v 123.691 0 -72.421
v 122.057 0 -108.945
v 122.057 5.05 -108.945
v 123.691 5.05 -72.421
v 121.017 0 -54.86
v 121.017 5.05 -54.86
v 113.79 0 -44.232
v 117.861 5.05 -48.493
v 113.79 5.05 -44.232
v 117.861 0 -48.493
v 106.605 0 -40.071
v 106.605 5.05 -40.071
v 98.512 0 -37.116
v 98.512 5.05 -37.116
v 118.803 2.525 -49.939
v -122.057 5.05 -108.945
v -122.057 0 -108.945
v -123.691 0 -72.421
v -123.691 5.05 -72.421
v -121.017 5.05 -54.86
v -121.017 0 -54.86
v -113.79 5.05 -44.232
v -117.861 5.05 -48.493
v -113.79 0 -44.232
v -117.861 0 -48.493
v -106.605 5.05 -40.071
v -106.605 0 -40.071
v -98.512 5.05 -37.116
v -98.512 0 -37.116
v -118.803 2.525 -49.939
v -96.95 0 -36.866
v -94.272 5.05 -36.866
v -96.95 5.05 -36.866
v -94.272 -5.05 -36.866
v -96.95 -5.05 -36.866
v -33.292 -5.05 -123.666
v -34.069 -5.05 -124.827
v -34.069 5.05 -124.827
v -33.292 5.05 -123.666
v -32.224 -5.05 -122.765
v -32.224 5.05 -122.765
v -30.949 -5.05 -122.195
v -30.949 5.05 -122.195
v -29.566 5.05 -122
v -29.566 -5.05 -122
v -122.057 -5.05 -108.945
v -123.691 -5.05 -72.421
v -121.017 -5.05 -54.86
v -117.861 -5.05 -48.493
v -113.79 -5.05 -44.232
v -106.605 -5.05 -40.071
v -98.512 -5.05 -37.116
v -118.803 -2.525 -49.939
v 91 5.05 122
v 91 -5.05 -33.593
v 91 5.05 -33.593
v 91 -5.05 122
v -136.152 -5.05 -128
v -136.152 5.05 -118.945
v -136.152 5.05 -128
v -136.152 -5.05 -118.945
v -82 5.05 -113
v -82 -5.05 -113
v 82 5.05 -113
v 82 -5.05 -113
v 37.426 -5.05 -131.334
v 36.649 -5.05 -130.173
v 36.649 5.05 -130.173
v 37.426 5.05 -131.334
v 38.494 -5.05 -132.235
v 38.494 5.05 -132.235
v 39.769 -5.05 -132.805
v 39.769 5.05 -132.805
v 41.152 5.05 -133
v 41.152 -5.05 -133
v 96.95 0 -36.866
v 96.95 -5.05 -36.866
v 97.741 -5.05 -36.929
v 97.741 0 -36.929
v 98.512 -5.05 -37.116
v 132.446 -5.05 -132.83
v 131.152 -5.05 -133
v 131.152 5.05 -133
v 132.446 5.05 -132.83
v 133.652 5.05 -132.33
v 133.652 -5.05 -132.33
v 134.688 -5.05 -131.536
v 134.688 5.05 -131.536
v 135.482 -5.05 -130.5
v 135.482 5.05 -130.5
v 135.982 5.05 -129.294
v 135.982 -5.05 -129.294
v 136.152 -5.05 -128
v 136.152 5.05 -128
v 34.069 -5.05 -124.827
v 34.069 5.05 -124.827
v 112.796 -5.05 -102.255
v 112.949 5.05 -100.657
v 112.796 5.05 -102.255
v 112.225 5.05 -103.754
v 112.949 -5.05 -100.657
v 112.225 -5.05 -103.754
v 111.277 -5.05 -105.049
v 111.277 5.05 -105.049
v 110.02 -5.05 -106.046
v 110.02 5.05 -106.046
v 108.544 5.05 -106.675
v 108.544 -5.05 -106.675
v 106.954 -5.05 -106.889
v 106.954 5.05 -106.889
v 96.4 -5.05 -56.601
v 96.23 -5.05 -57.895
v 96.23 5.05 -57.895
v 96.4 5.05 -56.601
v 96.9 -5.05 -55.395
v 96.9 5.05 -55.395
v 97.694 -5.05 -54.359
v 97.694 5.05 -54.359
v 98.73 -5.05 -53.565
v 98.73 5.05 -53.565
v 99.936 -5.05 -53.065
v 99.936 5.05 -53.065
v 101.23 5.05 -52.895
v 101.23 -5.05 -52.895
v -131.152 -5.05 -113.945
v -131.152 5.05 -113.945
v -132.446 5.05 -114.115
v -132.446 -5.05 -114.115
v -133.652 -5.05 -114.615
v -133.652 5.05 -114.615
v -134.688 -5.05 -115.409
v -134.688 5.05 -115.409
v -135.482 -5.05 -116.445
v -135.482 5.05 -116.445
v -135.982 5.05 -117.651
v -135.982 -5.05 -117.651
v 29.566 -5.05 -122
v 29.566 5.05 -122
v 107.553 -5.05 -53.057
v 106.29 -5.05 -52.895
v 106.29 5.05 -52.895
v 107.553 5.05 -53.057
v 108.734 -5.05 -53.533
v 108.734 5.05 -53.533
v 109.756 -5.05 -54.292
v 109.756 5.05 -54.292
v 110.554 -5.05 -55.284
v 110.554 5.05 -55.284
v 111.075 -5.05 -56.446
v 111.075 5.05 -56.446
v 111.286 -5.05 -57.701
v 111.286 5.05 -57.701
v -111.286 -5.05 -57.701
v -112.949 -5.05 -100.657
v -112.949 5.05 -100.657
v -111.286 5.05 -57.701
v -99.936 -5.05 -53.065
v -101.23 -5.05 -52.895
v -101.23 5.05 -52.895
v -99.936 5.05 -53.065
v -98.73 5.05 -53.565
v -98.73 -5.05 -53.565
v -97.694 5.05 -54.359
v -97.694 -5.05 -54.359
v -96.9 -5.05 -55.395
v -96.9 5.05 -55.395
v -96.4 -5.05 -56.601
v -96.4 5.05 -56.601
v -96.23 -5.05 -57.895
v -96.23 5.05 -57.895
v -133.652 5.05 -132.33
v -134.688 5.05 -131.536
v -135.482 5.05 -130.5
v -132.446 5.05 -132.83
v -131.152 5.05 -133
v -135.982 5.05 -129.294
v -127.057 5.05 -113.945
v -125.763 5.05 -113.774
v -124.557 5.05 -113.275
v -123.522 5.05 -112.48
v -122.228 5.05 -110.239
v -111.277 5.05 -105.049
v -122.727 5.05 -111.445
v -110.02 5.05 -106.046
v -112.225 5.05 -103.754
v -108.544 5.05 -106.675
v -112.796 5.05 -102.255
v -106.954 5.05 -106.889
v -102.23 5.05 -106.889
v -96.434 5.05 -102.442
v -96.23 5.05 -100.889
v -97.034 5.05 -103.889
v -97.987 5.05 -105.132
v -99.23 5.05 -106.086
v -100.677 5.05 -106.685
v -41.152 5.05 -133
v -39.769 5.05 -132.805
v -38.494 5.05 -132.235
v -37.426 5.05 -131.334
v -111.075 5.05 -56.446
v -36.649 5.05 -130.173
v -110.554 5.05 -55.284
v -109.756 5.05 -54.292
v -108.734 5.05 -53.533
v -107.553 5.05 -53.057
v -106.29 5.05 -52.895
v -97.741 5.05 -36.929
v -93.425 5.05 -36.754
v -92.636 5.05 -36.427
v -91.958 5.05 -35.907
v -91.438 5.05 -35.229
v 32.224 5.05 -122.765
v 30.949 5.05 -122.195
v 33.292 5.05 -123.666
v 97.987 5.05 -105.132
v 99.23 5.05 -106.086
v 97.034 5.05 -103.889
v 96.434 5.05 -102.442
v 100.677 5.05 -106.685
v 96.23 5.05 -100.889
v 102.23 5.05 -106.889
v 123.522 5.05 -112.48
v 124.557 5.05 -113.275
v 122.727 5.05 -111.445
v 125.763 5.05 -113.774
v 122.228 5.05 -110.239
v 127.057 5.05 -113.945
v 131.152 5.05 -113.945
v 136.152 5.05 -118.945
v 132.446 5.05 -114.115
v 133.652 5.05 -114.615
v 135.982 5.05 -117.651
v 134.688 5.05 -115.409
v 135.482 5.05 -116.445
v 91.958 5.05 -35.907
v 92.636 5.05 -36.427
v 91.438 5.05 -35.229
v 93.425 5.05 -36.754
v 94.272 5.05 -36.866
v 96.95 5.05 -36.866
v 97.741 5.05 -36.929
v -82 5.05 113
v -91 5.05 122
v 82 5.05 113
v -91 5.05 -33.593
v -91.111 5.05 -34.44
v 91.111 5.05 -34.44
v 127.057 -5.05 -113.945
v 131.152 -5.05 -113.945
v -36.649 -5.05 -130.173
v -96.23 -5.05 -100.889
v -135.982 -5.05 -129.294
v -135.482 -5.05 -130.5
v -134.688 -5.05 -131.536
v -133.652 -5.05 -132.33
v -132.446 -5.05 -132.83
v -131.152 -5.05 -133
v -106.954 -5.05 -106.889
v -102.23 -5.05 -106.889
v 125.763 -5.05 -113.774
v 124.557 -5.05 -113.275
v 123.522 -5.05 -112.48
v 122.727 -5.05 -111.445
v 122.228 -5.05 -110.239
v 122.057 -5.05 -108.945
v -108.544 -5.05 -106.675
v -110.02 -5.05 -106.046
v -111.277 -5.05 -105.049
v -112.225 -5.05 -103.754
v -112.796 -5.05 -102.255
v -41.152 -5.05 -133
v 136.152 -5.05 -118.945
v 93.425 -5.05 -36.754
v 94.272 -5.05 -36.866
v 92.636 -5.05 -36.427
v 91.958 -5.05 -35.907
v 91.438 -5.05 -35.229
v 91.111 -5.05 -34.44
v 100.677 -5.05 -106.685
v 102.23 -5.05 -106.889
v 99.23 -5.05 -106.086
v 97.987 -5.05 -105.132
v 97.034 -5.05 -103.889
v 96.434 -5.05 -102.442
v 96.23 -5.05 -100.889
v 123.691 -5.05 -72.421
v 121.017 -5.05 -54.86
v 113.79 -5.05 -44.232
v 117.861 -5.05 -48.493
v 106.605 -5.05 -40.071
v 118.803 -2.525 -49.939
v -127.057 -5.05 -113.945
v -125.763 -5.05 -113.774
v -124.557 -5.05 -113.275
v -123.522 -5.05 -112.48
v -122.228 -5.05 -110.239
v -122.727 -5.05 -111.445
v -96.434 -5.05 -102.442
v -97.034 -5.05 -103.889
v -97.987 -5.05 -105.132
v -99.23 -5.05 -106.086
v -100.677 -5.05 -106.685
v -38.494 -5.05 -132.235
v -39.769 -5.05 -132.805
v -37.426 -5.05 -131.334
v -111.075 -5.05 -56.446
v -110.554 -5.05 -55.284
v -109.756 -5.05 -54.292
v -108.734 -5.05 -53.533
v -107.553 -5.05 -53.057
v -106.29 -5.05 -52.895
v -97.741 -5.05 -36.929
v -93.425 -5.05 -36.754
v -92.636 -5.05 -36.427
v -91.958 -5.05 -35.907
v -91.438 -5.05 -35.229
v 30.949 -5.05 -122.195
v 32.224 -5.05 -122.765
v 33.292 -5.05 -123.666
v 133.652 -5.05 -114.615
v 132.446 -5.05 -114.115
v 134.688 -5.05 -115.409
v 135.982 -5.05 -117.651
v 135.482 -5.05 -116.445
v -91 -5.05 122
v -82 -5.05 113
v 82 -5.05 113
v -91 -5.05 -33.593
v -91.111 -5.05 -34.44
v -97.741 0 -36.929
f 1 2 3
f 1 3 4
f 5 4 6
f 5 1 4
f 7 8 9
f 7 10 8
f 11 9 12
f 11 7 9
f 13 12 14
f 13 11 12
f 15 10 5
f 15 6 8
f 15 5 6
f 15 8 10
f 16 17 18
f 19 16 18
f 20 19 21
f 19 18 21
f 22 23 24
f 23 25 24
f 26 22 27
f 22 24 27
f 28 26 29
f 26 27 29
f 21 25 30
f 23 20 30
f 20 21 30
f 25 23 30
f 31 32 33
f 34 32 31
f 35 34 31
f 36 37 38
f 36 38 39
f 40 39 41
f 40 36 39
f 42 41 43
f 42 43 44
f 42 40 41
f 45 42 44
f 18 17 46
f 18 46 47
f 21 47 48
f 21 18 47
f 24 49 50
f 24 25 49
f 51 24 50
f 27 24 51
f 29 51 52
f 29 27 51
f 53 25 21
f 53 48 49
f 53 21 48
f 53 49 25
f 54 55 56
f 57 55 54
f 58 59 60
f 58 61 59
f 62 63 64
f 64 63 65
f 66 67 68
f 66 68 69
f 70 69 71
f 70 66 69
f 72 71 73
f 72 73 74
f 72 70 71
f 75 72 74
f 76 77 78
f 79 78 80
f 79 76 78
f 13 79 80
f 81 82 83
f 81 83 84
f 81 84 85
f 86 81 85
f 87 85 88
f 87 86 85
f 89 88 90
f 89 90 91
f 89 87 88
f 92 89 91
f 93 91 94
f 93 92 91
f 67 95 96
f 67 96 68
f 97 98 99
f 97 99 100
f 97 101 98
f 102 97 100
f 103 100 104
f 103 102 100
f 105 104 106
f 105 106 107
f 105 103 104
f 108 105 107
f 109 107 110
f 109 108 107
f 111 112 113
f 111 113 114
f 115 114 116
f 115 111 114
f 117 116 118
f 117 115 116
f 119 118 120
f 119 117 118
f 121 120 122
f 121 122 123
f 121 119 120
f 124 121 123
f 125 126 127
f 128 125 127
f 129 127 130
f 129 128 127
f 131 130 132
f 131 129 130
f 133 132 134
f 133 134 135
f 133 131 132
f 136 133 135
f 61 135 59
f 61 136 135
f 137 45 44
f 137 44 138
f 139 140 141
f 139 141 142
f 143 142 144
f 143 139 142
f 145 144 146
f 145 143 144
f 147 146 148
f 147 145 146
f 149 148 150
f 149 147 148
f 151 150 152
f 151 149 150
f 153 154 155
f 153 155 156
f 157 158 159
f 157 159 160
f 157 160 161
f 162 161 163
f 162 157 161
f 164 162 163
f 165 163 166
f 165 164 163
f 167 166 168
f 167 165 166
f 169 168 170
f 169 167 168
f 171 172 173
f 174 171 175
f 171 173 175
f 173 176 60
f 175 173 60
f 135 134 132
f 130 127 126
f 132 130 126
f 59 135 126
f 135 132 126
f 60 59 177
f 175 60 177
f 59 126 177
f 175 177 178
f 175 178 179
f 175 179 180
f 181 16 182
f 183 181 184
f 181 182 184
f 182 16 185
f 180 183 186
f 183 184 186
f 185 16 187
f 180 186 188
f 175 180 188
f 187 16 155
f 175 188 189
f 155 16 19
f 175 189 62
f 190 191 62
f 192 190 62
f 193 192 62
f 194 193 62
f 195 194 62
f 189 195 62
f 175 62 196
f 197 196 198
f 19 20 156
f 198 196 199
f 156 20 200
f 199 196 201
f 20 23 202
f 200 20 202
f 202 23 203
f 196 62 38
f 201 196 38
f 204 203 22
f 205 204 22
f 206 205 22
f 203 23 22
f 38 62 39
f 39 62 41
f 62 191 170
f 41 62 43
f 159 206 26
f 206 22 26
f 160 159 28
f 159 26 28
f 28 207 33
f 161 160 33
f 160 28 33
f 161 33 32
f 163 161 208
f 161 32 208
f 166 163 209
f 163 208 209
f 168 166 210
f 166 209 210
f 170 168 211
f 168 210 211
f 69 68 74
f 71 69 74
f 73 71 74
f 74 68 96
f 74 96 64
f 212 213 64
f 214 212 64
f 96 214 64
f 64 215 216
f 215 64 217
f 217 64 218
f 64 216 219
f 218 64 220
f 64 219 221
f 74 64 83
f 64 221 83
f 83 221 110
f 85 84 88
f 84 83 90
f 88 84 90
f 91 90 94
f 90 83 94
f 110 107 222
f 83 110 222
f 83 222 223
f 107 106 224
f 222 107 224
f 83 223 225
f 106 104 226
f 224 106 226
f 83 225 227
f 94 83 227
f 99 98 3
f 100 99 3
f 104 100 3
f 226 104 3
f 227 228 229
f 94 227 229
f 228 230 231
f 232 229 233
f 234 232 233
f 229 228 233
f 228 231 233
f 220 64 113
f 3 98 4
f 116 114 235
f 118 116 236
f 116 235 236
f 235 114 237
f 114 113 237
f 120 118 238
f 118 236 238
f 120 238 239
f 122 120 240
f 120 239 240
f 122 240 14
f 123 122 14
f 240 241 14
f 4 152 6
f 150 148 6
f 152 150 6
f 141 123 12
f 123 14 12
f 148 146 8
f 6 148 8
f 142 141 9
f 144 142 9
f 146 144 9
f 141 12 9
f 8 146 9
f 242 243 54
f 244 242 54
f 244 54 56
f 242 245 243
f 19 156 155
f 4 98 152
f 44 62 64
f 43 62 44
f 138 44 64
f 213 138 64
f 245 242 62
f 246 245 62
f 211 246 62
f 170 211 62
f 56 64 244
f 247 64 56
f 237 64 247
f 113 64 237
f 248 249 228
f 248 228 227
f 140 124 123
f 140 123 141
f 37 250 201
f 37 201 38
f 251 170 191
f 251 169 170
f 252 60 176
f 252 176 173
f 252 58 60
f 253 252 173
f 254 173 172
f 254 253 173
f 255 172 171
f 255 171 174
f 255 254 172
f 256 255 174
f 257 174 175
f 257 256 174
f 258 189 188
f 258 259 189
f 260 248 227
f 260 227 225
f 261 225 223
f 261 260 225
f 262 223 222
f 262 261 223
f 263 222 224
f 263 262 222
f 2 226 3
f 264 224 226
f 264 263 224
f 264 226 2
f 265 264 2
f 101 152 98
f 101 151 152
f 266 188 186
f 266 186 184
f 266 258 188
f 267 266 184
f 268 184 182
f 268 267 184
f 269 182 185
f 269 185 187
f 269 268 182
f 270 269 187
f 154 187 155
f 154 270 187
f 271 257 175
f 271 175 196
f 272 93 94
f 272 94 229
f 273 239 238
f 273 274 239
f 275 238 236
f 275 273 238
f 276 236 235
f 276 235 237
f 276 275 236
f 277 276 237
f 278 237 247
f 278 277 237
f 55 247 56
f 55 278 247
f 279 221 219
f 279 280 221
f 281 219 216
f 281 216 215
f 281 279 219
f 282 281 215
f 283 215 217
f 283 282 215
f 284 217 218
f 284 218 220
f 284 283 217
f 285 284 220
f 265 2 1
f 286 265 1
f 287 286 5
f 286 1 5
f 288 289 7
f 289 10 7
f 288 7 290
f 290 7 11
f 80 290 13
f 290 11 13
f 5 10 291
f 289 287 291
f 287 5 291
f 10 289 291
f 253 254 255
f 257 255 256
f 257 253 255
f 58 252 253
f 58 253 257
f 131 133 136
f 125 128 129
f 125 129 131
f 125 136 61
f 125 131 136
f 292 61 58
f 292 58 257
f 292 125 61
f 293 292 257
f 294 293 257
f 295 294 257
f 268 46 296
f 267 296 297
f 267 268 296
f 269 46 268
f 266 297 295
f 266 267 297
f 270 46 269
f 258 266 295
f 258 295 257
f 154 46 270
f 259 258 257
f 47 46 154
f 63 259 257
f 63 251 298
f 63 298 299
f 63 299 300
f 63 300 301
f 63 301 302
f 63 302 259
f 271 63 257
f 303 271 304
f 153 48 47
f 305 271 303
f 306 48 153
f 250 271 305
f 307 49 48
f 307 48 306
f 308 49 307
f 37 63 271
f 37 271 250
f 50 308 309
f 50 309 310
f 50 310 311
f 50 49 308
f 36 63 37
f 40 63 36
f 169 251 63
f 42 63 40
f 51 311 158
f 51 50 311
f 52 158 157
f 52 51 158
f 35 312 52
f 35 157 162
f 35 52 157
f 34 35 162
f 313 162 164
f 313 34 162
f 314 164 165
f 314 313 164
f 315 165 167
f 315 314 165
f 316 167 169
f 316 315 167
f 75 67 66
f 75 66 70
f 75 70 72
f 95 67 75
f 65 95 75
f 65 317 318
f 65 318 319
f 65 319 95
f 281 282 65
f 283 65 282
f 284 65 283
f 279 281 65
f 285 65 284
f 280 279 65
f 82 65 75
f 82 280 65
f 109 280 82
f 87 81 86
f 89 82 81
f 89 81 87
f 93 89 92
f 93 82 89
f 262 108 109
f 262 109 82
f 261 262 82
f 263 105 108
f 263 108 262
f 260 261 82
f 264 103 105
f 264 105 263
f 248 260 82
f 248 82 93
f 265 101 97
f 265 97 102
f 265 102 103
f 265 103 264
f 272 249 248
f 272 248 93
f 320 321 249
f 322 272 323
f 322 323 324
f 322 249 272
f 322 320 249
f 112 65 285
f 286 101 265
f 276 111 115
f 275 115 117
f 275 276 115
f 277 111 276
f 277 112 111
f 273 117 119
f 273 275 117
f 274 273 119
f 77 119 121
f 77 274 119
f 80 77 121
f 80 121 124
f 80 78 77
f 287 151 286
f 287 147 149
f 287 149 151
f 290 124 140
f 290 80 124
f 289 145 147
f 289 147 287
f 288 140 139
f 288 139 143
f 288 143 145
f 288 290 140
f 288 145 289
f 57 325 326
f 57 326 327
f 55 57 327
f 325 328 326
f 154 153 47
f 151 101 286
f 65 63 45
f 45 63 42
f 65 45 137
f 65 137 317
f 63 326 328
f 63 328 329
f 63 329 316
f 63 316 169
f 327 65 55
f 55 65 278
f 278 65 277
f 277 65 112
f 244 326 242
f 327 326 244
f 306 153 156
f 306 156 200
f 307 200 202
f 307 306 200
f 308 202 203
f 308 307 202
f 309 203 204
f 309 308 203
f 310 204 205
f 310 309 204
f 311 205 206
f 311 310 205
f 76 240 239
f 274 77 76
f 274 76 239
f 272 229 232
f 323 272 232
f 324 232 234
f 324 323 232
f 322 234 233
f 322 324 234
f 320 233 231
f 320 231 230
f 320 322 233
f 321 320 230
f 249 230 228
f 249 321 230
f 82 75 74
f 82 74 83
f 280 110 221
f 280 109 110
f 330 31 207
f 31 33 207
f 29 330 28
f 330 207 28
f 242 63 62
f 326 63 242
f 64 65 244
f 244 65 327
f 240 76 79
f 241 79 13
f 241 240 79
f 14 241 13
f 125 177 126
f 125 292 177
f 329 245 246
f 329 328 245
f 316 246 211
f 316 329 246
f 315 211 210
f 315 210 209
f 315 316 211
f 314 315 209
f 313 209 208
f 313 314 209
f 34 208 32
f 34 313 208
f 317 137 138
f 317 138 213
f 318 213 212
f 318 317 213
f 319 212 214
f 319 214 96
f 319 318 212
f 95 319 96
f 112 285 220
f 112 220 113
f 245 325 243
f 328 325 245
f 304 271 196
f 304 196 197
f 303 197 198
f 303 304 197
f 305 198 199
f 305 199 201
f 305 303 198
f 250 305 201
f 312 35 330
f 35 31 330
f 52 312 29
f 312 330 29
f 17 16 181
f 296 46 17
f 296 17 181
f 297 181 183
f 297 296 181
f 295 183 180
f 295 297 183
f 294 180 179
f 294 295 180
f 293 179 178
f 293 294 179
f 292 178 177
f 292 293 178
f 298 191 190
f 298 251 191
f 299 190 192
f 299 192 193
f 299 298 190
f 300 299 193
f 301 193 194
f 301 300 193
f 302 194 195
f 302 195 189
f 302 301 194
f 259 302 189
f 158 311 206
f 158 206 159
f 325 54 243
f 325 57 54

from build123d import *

# Parameters (mm, degrees)
F0_W     = 164
F0_H     = 226
F1_DEPTH = 5.05
F2_R     = 5
F3_R     = 5


with BuildPart() as f1:
    # F0 (on Front) → F1 (new body, symmetric)
    with BuildSketch(Plane.XZ):
        with BuildLine():
            ThreePointArc((-136.1519984865, -128), (-134.6875323924, -131.5355339059), (-131.1519984865, -133))
            Line((-131.1519984865, -133), (-41.1519984865, -133))
            ThreePointArc((-41.1519984865, -133), (-38.493646634, -132.2347568323), (-36.6490090186, -130.1732661714))
            Line((-36.6490090186, -130.1732661714), (-34.0686259291, -124.8267338286))
            ThreePointArc((-34.0686259291, -124.8267338286), (-32.2239883137, -122.7652431677), (-29.5656364612, -122))
            Line((-29.5656364612, -122), (29.5656364612, -122))
            ThreePointArc((29.5656364612, -122), (32.2239883137, -122.7652431677), (34.0686259291, -124.8267338286))
            Line((34.0686259291, -124.8267338286), (36.6490090186, -130.1732661714))
            ThreePointArc((36.6490090186, -130.1732661714), (38.493646634, -132.2347568323), (41.1519984865, -133))
            Line((41.1519984865, -133), (131.1519984865, -133))
            ThreePointArc((131.1519984865, -133), (134.6875323924, -131.5355339059), (136.1519984865, -128))
            Line((136.1519984865, -128), (136.1519984865, -118.9447689056))
            ThreePointArc((136.1519984865, -118.9447689056), (134.6875323924, -115.4092349997), (131.1519984865, -113.9447689056))
            Line((131.1519984865, -113.9447689056), (127.0574602485, -113.9447689056))
            ThreePointArc((127.0574602485, -113.9447689056), (123.5219263425, -112.4803028116), (122.0574602485, -108.9447689056))
            add(Edge.make_bspline(
                [(122.0574602485, -108.9447689056), (123.931935402, -85.3492312011), (127.0202597137, -46.4739905223), (106.0084033701, -39.5765251934), (97.7498069406, -36.8655137718)],
                knots=[0, 0, 0, 0, 0.6069554115, 1, 1, 1, 1], degree=3))
            Line((97.7498069406, -36.8655137718), (94.2721525095, -36.8655137718))
            ThreePointArc((94.2721525095, -36.8655137718), (91.958391281, -35.9071224908), (91, -33.5933612622))
            Line((91, -33.5933612622), (91, 122))
            Line((91, 122), (-91, 122))
            Line((-91, 122), (-91, -33.5933612622))
            ThreePointArc((-91, -33.5933612622), (-91.958391281, -35.9071224908), (-94.2721525095, -36.8655137718))
            Line((-94.2721525095, -36.8655137718), (-97.7498069406, -36.8655137718))
            add(Edge.make_bspline(
                [(-122.0574602485, -108.9447689056), (-123.931935402, -85.3492312011), (-127.0202597137, -46.4739905223), (-106.0084033701, -39.5765251934), (-97.7498069406, -36.8655137718)],
                knots=[0, 0, 0, 0, 0.6069554115, 1, 1, 1, 1], degree=3))
            ThreePointArc((-122.0574602485, -108.9447689056), (-123.5219263425, -112.4803028116), (-127.0574602485, -113.9447689056))
            Line((-127.0574602485, -113.9447689056), (-131.1519984865, -113.9447689056))
            ThreePointArc((-131.1519984865, -113.9447689056), (-134.6875323924, -115.4092349997), (-136.1519984865, -118.9447689056))
            Line((-136.1519984865, -118.9447689056), (-136.1519984865, -128))
        make_face()
        with BuildLine():
            Line((-112.9490544478, -100.6573063768), (-111.2859340244, -57.7014318636))
            ThreePointArc((-111.2859340244, -57.7014318636), (-109.7561453304, -54.291595458), (-106.2896773219, -52.8948716819))
            Line((-106.2896773219, -52.8948716819), (-101.2297698661, -52.8948716819))
            ThreePointArc((-101.2297698661, -52.8948716819), (-97.6942359602, -54.359337776), (-96.2297698661, -57.8948716819))
            Line((-96.2297698661, -57.8948716819), (-96.2297698661, -100.8894341588))
            ThreePointArc((-96.2297698661, -100.8894341588), (-97.987129179, -105.1320748459), (-102.2297698661, -106.8894341588))
            Line((-102.2297698661, -106.8894341588), (-106.9535464048, -106.8894341588))
            ThreePointArc((-106.9535464048, -106.8894341588), (-111.2774778735, -105.049195769), (-112.9490544478, -100.6573063768))
        make_face(mode=Mode.SUBTRACT)
        with BuildLine():
            Line((96.2297698661, -100.8894341588), (96.2297698661, -57.8948716819))
            ThreePointArc((96.2297698661, -57.8948716819), (97.6942359602, -54.359337776), (101.2297698661, -52.8948716819))
            Line((101.2297698661, -52.8948716819), (106.2896773219, -52.8948716819))
            ThreePointArc((106.2896773219, -52.8948716819), (109.7561453304, -54.291595458), (111.2859340244, -57.7014318636))
            Line((111.2859340244, -57.7014318636), (112.9490544478, -100.6573063768))
            ThreePointArc((112.9490544478, -100.6573063768), (111.2774778735, -105.049195769), (106.9535464048, -106.8894341588))
            Line((106.9535464048, -106.8894341588), (102.2297698661, -106.8894341588))
            ThreePointArc((102.2297698661, -106.8894341588), (97.987129179, -105.1320748459), (96.2297698661, -100.8894341588))
        make_face(mode=Mode.SUBTRACT)
        Rectangle(F0_W, F0_H, mode=Mode.SUBTRACT)
    extrude(amount=F1_DEPTH, both=True)

    # F2
    f2_edges = [f1.edges().sort_by_distance(p)[0] for p in [
        (97.749807, 2.525, -36.865514),
        (97.749807, -2.525, -36.865514),
    ]]
    fillet(f2_edges, radius=F2_R)

    # F3
    f3_edges = [f1.edges().sort_by_distance(p)[0] for p in [
        (-97.749807, 2.525, -36.865514),
        (-97.749807, -2.525, -36.865514),
    ]]
    fillet(f3_edges, radius=F3_R)


solid = f1.part
